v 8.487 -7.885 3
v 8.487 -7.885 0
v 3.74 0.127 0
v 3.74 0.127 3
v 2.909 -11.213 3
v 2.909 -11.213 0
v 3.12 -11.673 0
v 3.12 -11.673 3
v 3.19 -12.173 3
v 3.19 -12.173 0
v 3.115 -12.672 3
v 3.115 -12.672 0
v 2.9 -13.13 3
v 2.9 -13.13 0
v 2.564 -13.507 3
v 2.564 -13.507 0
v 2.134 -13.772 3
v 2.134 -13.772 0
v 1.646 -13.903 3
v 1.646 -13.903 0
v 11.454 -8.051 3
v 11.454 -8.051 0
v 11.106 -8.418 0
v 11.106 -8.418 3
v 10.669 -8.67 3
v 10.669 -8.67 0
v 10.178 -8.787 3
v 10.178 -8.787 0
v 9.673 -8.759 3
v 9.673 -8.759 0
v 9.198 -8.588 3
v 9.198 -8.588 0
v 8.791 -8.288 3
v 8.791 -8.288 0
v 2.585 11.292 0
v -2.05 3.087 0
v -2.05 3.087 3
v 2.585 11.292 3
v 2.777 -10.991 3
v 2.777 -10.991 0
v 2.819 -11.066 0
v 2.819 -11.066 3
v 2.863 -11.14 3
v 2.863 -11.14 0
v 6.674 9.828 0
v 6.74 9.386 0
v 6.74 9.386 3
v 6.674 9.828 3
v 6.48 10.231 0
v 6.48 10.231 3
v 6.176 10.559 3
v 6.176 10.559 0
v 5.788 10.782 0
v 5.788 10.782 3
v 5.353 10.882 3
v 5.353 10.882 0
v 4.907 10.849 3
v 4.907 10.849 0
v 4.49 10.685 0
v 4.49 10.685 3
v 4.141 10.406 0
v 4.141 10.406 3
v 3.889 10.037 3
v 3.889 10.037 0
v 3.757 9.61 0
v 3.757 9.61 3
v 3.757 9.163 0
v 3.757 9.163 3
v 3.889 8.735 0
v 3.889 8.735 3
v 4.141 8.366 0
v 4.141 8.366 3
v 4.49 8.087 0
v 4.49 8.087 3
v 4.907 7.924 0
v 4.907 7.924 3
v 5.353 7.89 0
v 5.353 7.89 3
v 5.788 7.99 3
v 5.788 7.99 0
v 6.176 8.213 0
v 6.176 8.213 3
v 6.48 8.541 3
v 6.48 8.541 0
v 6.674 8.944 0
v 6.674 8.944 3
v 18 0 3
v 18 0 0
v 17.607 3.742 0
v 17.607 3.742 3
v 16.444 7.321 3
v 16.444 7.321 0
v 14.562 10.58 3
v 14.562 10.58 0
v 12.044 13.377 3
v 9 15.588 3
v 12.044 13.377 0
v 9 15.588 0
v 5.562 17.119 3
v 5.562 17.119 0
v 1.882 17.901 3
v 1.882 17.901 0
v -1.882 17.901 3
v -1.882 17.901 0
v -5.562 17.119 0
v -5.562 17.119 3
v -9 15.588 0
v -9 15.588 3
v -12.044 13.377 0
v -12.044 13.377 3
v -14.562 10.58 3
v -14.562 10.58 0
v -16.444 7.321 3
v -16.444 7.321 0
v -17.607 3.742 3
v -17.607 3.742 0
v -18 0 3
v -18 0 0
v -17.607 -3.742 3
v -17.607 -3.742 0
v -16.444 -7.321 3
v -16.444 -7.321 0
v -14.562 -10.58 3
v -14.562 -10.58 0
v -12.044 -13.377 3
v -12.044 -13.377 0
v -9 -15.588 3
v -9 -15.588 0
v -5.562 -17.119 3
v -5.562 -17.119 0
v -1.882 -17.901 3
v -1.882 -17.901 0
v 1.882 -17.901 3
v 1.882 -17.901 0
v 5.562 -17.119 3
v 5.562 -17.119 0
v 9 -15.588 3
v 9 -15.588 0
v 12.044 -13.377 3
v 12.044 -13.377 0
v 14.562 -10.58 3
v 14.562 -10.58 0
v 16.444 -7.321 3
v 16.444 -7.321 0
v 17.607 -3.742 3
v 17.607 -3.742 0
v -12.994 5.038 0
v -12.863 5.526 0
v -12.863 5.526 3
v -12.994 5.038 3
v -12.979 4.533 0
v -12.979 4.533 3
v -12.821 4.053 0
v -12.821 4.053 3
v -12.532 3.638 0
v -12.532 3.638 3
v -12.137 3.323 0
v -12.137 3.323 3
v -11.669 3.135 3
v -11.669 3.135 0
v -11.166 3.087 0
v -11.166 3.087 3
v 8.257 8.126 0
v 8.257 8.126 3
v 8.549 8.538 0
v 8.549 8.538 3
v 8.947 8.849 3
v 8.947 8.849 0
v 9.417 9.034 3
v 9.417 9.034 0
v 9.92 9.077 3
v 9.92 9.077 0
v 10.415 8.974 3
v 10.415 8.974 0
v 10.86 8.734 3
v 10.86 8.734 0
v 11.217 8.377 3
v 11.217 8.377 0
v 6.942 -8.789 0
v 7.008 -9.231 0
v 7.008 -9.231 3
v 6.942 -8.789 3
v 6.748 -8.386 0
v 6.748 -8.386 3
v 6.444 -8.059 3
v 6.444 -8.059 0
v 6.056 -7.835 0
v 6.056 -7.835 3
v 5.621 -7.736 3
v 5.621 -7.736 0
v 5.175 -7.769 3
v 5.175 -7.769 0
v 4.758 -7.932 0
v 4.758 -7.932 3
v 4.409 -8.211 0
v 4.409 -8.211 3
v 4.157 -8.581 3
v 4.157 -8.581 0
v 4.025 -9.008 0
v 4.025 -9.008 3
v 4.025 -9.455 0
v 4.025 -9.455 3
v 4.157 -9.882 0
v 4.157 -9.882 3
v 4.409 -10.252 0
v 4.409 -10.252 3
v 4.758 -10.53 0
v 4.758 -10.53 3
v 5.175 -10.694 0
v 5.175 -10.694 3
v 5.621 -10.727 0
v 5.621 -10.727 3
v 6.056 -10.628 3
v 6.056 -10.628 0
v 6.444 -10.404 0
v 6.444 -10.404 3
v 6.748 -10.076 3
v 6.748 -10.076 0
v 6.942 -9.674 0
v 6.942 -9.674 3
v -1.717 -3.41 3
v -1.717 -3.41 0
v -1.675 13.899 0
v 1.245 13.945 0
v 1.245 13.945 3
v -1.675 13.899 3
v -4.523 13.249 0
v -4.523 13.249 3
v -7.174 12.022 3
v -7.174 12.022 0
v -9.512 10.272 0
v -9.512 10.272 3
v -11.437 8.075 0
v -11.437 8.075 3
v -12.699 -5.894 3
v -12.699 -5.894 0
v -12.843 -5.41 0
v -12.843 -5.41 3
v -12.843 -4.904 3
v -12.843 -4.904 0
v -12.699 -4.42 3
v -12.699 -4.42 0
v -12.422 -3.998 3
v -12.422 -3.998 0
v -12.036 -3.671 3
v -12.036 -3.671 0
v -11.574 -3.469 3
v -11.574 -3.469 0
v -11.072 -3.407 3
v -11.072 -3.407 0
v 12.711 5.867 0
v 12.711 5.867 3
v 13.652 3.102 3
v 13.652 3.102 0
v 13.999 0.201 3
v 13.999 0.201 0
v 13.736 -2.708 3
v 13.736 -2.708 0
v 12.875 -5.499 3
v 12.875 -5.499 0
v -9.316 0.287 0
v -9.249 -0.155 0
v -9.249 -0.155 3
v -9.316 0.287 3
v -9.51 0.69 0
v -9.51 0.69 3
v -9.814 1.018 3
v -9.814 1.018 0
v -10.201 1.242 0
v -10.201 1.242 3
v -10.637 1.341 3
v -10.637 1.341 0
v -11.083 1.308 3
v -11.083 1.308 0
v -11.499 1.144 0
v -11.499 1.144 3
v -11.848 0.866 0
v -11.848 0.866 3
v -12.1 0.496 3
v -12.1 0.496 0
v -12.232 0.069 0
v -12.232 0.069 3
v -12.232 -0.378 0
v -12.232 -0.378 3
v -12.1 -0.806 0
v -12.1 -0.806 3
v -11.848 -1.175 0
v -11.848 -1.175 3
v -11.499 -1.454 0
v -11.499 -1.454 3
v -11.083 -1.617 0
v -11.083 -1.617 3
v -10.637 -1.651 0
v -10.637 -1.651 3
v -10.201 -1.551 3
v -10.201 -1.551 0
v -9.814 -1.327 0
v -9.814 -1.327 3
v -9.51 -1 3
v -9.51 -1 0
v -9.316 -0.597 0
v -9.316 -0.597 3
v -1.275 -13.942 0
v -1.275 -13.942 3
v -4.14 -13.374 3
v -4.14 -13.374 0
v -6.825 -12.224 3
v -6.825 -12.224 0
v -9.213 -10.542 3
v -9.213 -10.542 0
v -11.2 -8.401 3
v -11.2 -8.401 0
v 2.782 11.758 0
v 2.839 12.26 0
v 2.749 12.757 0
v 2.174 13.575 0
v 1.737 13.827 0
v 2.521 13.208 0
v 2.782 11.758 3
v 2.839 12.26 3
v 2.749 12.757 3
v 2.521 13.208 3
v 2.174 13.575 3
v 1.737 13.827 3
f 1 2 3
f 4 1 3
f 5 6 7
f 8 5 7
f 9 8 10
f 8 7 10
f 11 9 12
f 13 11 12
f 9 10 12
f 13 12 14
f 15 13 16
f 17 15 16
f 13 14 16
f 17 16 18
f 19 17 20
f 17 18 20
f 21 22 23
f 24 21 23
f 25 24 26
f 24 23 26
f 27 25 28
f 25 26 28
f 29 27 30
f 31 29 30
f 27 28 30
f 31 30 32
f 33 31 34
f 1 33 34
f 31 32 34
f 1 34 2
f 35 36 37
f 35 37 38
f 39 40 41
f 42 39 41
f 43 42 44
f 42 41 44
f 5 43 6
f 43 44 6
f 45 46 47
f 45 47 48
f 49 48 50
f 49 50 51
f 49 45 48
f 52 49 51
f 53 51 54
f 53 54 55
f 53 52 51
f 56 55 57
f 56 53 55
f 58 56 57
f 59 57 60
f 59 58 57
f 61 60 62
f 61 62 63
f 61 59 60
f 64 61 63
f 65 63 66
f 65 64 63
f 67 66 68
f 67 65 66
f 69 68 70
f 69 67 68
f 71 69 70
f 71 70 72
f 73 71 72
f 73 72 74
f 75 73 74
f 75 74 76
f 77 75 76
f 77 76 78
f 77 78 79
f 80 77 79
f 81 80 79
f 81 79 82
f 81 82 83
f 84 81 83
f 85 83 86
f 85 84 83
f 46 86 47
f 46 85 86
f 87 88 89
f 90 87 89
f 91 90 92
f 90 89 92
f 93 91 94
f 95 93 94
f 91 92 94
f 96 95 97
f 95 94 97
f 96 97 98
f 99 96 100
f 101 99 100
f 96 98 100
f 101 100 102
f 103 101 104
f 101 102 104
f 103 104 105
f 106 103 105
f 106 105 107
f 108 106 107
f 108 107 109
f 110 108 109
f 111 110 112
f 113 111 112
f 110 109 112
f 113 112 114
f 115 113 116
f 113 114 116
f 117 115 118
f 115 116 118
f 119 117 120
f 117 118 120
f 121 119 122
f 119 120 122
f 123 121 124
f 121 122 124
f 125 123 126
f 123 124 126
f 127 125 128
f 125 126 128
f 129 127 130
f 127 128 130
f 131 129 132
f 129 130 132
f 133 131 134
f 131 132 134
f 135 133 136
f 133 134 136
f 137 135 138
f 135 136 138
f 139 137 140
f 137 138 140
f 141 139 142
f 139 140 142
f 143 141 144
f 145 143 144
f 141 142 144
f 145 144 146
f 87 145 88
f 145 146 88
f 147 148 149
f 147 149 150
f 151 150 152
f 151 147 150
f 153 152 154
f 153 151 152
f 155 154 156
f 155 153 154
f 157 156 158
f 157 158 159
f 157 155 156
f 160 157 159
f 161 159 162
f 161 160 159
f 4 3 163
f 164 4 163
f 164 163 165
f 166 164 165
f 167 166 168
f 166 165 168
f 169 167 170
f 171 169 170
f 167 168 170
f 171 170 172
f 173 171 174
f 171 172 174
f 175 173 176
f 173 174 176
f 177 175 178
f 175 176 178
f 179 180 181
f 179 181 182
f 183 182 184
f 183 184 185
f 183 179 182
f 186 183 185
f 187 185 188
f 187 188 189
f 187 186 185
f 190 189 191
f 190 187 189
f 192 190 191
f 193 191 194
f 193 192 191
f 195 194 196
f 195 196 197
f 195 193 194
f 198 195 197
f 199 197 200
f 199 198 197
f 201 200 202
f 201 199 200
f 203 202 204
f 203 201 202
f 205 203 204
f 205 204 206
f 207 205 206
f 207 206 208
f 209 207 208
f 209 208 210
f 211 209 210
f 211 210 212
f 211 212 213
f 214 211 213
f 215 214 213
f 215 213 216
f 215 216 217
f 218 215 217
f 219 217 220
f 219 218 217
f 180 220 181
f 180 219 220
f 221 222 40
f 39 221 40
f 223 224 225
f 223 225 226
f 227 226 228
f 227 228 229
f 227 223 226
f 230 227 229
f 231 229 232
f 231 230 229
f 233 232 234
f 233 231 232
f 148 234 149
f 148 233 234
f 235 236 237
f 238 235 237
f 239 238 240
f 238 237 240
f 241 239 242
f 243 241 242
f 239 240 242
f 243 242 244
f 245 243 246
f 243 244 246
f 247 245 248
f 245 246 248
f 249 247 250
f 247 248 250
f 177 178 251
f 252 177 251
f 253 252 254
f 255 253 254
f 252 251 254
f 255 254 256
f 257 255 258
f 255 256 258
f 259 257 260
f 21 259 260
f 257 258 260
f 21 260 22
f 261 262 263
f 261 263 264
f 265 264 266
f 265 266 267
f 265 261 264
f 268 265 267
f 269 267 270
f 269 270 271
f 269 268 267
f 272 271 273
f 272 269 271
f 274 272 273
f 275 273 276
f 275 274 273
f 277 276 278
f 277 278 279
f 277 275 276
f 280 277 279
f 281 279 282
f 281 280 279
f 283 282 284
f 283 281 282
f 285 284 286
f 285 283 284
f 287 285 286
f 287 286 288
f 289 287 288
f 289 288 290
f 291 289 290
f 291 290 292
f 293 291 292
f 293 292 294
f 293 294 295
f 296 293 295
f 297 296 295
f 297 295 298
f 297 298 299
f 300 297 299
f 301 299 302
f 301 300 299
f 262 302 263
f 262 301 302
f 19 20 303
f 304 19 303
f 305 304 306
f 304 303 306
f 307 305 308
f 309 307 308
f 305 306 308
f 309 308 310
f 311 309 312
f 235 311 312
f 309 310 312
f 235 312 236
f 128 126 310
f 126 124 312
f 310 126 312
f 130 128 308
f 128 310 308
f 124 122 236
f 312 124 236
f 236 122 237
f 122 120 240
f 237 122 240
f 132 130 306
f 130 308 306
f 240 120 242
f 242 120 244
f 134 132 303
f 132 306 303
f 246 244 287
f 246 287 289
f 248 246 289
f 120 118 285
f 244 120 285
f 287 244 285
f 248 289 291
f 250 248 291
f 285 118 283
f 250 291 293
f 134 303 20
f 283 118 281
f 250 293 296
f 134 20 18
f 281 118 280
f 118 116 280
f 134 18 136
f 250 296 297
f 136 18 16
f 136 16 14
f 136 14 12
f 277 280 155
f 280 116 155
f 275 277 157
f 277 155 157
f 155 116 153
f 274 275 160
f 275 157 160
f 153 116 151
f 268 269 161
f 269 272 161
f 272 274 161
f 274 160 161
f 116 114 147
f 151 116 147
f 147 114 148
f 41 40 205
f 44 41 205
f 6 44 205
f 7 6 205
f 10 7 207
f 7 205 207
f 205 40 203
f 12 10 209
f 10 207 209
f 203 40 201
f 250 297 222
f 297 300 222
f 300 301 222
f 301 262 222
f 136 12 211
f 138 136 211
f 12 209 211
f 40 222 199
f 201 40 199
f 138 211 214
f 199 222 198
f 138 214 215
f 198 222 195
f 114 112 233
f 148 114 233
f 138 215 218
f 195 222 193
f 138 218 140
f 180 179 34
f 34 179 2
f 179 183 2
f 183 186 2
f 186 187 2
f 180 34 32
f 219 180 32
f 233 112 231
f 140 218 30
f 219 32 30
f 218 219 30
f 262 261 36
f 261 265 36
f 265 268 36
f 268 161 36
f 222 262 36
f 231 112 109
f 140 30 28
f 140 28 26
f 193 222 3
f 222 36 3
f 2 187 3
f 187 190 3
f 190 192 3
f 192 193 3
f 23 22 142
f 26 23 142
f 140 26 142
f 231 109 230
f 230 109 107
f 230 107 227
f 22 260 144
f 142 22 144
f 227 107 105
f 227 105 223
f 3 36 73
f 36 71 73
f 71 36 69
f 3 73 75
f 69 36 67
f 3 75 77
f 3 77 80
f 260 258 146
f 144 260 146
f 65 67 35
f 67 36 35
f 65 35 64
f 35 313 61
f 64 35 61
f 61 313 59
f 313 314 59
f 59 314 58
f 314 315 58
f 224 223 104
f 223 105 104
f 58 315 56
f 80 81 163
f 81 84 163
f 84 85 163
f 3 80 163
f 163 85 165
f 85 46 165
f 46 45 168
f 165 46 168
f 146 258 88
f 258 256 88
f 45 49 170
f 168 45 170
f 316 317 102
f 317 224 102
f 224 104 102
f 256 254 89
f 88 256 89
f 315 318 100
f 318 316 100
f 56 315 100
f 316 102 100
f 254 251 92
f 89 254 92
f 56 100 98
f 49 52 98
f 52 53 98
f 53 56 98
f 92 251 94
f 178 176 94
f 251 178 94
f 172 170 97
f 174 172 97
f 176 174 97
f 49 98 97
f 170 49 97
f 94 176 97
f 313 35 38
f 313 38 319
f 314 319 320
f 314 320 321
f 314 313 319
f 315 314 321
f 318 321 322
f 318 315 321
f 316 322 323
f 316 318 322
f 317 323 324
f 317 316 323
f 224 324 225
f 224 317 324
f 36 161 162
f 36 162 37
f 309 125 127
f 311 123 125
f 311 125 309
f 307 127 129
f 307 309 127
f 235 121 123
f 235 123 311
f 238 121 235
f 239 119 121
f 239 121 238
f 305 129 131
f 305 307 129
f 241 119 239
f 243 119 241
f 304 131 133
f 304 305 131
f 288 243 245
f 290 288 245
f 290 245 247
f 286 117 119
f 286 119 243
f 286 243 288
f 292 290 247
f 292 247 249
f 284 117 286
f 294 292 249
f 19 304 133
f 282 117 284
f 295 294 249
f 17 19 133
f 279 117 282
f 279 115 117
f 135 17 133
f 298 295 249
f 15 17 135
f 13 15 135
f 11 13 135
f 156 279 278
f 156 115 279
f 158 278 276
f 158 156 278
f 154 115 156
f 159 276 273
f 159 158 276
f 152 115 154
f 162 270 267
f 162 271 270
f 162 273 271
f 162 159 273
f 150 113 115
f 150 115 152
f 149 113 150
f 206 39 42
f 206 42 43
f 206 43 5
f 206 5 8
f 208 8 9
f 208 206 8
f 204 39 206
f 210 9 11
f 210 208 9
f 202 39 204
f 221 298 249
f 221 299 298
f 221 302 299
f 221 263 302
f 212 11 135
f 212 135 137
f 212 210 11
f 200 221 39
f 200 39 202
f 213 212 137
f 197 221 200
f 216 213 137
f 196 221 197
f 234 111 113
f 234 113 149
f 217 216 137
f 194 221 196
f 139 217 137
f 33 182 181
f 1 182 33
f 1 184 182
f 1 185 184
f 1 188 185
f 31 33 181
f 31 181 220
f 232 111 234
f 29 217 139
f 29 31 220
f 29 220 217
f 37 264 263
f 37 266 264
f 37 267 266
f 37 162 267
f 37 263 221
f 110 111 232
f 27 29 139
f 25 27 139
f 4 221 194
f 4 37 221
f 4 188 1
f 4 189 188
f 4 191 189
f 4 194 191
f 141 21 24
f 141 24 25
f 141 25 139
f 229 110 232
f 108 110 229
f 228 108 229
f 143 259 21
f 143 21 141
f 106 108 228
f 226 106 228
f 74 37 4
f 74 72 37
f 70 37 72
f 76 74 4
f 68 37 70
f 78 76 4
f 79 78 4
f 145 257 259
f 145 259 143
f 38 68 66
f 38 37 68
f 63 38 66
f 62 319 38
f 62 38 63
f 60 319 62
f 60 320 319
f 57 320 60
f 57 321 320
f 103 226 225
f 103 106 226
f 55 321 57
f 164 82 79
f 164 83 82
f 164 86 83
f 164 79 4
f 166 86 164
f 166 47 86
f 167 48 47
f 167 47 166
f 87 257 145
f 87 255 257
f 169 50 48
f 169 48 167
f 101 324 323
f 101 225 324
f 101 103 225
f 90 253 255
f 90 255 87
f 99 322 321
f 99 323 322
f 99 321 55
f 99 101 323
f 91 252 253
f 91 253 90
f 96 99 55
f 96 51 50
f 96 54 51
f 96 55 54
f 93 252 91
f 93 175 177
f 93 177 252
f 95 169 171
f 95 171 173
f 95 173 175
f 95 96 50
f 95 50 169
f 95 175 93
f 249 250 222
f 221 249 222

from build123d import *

# Parameters (mm, degrees)
ESQUISSE1_R        = 18
ESQUISSE1_R_2      = 1.5
BOSS_EXTRU_1_DEPTH = 3


with BuildPart() as part:
    # Esquisse1 → Boss.-Extru.1 (new body)
    with BuildSketch(Plane.XY):
        Circle(ESQUISSE1_R)
        with Locations((5.240453276, 9.386167986)):
            Circle(ESQUISSE1_R_2, mode=Mode.SUBTRACT)
        with Locations((5.508433282, -9.231449657)):
            Circle(ESQUISSE1_R_2, mode=Mode.SUBTRACT)
        with Locations((-10.748886558, -0.154718329)):
            Circle(ESQUISSE1_R_2, mode=Mode.SUBTRACT)
        with BuildLine():
            Line((-11.072133243, -3.407490345), (-1.716682497, -3.409655851))
            Line((-1.716682497, -3.409655851), (2.776978064, -10.990617044))
            ThreePointArc((2.776978064, -10.990617044), (2.840789334, -11.103330491), (2.909041031, -11.213411848))
            ThreePointArc((2.909041031, -11.213411848), (3.02444637, -12.90884018), (1.646159643, -13.902883098))
            ThreePointArc((1.646159643, -13.902883098), (-6.824776359, -12.22384668), (-12.698957381, -5.893766319))
            ThreePointArc((-12.698957381, -5.893766319), (-12.575965538, -4.198871447), (-11.072133243, -3.407490345))
        make_face(mode=Mode.SUBTRACT)
        with BuildLine():
            Line((-11.165620039, 3.087402491), (-2.050122008, 3.087402491))
            Line((-2.050122008, 3.087402491), (2.58509342, 11.292493835))
            ThreePointArc((2.58509342, 11.292493835), (2.651653429, 12.990541357), (1.245327334, 13.944502853))
            ThreePointArc((1.245327334, 13.944502853), (-7.173773577, 12.022353042), (-12.86332977, 5.525825479))
            ThreePointArc((-12.86332977, 5.525825479), (-12.691606715, 3.835172702), (-11.165620039, 3.087402491))
        make_face(mode=Mode.SUBTRACT)
        with BuildLine():
            Line((8.487039823, -7.88500349), (3.740322398, 0.12713591))
            Line((3.740322398, 0.12713591), (8.256579008, 8.126009358))
            ThreePointArc((8.256579008, 8.126009358), (9.667160345, 9.073667479), (11.217170127, 8.377057619))
            ThreePointArc((11.217170127, 8.377057619), (13.998549936, 0.201493638), (11.453630047, -8.050736534))
            ThreePointArc((11.453630047, -8.050736534), (9.92431211, -8.79166991), (8.487039823, -7.88500349))
        make_face(mode=Mode.SUBTRACT)
    extrude(amount=BOSS_EXTRU_1_DEPTH)


solid = part.part
